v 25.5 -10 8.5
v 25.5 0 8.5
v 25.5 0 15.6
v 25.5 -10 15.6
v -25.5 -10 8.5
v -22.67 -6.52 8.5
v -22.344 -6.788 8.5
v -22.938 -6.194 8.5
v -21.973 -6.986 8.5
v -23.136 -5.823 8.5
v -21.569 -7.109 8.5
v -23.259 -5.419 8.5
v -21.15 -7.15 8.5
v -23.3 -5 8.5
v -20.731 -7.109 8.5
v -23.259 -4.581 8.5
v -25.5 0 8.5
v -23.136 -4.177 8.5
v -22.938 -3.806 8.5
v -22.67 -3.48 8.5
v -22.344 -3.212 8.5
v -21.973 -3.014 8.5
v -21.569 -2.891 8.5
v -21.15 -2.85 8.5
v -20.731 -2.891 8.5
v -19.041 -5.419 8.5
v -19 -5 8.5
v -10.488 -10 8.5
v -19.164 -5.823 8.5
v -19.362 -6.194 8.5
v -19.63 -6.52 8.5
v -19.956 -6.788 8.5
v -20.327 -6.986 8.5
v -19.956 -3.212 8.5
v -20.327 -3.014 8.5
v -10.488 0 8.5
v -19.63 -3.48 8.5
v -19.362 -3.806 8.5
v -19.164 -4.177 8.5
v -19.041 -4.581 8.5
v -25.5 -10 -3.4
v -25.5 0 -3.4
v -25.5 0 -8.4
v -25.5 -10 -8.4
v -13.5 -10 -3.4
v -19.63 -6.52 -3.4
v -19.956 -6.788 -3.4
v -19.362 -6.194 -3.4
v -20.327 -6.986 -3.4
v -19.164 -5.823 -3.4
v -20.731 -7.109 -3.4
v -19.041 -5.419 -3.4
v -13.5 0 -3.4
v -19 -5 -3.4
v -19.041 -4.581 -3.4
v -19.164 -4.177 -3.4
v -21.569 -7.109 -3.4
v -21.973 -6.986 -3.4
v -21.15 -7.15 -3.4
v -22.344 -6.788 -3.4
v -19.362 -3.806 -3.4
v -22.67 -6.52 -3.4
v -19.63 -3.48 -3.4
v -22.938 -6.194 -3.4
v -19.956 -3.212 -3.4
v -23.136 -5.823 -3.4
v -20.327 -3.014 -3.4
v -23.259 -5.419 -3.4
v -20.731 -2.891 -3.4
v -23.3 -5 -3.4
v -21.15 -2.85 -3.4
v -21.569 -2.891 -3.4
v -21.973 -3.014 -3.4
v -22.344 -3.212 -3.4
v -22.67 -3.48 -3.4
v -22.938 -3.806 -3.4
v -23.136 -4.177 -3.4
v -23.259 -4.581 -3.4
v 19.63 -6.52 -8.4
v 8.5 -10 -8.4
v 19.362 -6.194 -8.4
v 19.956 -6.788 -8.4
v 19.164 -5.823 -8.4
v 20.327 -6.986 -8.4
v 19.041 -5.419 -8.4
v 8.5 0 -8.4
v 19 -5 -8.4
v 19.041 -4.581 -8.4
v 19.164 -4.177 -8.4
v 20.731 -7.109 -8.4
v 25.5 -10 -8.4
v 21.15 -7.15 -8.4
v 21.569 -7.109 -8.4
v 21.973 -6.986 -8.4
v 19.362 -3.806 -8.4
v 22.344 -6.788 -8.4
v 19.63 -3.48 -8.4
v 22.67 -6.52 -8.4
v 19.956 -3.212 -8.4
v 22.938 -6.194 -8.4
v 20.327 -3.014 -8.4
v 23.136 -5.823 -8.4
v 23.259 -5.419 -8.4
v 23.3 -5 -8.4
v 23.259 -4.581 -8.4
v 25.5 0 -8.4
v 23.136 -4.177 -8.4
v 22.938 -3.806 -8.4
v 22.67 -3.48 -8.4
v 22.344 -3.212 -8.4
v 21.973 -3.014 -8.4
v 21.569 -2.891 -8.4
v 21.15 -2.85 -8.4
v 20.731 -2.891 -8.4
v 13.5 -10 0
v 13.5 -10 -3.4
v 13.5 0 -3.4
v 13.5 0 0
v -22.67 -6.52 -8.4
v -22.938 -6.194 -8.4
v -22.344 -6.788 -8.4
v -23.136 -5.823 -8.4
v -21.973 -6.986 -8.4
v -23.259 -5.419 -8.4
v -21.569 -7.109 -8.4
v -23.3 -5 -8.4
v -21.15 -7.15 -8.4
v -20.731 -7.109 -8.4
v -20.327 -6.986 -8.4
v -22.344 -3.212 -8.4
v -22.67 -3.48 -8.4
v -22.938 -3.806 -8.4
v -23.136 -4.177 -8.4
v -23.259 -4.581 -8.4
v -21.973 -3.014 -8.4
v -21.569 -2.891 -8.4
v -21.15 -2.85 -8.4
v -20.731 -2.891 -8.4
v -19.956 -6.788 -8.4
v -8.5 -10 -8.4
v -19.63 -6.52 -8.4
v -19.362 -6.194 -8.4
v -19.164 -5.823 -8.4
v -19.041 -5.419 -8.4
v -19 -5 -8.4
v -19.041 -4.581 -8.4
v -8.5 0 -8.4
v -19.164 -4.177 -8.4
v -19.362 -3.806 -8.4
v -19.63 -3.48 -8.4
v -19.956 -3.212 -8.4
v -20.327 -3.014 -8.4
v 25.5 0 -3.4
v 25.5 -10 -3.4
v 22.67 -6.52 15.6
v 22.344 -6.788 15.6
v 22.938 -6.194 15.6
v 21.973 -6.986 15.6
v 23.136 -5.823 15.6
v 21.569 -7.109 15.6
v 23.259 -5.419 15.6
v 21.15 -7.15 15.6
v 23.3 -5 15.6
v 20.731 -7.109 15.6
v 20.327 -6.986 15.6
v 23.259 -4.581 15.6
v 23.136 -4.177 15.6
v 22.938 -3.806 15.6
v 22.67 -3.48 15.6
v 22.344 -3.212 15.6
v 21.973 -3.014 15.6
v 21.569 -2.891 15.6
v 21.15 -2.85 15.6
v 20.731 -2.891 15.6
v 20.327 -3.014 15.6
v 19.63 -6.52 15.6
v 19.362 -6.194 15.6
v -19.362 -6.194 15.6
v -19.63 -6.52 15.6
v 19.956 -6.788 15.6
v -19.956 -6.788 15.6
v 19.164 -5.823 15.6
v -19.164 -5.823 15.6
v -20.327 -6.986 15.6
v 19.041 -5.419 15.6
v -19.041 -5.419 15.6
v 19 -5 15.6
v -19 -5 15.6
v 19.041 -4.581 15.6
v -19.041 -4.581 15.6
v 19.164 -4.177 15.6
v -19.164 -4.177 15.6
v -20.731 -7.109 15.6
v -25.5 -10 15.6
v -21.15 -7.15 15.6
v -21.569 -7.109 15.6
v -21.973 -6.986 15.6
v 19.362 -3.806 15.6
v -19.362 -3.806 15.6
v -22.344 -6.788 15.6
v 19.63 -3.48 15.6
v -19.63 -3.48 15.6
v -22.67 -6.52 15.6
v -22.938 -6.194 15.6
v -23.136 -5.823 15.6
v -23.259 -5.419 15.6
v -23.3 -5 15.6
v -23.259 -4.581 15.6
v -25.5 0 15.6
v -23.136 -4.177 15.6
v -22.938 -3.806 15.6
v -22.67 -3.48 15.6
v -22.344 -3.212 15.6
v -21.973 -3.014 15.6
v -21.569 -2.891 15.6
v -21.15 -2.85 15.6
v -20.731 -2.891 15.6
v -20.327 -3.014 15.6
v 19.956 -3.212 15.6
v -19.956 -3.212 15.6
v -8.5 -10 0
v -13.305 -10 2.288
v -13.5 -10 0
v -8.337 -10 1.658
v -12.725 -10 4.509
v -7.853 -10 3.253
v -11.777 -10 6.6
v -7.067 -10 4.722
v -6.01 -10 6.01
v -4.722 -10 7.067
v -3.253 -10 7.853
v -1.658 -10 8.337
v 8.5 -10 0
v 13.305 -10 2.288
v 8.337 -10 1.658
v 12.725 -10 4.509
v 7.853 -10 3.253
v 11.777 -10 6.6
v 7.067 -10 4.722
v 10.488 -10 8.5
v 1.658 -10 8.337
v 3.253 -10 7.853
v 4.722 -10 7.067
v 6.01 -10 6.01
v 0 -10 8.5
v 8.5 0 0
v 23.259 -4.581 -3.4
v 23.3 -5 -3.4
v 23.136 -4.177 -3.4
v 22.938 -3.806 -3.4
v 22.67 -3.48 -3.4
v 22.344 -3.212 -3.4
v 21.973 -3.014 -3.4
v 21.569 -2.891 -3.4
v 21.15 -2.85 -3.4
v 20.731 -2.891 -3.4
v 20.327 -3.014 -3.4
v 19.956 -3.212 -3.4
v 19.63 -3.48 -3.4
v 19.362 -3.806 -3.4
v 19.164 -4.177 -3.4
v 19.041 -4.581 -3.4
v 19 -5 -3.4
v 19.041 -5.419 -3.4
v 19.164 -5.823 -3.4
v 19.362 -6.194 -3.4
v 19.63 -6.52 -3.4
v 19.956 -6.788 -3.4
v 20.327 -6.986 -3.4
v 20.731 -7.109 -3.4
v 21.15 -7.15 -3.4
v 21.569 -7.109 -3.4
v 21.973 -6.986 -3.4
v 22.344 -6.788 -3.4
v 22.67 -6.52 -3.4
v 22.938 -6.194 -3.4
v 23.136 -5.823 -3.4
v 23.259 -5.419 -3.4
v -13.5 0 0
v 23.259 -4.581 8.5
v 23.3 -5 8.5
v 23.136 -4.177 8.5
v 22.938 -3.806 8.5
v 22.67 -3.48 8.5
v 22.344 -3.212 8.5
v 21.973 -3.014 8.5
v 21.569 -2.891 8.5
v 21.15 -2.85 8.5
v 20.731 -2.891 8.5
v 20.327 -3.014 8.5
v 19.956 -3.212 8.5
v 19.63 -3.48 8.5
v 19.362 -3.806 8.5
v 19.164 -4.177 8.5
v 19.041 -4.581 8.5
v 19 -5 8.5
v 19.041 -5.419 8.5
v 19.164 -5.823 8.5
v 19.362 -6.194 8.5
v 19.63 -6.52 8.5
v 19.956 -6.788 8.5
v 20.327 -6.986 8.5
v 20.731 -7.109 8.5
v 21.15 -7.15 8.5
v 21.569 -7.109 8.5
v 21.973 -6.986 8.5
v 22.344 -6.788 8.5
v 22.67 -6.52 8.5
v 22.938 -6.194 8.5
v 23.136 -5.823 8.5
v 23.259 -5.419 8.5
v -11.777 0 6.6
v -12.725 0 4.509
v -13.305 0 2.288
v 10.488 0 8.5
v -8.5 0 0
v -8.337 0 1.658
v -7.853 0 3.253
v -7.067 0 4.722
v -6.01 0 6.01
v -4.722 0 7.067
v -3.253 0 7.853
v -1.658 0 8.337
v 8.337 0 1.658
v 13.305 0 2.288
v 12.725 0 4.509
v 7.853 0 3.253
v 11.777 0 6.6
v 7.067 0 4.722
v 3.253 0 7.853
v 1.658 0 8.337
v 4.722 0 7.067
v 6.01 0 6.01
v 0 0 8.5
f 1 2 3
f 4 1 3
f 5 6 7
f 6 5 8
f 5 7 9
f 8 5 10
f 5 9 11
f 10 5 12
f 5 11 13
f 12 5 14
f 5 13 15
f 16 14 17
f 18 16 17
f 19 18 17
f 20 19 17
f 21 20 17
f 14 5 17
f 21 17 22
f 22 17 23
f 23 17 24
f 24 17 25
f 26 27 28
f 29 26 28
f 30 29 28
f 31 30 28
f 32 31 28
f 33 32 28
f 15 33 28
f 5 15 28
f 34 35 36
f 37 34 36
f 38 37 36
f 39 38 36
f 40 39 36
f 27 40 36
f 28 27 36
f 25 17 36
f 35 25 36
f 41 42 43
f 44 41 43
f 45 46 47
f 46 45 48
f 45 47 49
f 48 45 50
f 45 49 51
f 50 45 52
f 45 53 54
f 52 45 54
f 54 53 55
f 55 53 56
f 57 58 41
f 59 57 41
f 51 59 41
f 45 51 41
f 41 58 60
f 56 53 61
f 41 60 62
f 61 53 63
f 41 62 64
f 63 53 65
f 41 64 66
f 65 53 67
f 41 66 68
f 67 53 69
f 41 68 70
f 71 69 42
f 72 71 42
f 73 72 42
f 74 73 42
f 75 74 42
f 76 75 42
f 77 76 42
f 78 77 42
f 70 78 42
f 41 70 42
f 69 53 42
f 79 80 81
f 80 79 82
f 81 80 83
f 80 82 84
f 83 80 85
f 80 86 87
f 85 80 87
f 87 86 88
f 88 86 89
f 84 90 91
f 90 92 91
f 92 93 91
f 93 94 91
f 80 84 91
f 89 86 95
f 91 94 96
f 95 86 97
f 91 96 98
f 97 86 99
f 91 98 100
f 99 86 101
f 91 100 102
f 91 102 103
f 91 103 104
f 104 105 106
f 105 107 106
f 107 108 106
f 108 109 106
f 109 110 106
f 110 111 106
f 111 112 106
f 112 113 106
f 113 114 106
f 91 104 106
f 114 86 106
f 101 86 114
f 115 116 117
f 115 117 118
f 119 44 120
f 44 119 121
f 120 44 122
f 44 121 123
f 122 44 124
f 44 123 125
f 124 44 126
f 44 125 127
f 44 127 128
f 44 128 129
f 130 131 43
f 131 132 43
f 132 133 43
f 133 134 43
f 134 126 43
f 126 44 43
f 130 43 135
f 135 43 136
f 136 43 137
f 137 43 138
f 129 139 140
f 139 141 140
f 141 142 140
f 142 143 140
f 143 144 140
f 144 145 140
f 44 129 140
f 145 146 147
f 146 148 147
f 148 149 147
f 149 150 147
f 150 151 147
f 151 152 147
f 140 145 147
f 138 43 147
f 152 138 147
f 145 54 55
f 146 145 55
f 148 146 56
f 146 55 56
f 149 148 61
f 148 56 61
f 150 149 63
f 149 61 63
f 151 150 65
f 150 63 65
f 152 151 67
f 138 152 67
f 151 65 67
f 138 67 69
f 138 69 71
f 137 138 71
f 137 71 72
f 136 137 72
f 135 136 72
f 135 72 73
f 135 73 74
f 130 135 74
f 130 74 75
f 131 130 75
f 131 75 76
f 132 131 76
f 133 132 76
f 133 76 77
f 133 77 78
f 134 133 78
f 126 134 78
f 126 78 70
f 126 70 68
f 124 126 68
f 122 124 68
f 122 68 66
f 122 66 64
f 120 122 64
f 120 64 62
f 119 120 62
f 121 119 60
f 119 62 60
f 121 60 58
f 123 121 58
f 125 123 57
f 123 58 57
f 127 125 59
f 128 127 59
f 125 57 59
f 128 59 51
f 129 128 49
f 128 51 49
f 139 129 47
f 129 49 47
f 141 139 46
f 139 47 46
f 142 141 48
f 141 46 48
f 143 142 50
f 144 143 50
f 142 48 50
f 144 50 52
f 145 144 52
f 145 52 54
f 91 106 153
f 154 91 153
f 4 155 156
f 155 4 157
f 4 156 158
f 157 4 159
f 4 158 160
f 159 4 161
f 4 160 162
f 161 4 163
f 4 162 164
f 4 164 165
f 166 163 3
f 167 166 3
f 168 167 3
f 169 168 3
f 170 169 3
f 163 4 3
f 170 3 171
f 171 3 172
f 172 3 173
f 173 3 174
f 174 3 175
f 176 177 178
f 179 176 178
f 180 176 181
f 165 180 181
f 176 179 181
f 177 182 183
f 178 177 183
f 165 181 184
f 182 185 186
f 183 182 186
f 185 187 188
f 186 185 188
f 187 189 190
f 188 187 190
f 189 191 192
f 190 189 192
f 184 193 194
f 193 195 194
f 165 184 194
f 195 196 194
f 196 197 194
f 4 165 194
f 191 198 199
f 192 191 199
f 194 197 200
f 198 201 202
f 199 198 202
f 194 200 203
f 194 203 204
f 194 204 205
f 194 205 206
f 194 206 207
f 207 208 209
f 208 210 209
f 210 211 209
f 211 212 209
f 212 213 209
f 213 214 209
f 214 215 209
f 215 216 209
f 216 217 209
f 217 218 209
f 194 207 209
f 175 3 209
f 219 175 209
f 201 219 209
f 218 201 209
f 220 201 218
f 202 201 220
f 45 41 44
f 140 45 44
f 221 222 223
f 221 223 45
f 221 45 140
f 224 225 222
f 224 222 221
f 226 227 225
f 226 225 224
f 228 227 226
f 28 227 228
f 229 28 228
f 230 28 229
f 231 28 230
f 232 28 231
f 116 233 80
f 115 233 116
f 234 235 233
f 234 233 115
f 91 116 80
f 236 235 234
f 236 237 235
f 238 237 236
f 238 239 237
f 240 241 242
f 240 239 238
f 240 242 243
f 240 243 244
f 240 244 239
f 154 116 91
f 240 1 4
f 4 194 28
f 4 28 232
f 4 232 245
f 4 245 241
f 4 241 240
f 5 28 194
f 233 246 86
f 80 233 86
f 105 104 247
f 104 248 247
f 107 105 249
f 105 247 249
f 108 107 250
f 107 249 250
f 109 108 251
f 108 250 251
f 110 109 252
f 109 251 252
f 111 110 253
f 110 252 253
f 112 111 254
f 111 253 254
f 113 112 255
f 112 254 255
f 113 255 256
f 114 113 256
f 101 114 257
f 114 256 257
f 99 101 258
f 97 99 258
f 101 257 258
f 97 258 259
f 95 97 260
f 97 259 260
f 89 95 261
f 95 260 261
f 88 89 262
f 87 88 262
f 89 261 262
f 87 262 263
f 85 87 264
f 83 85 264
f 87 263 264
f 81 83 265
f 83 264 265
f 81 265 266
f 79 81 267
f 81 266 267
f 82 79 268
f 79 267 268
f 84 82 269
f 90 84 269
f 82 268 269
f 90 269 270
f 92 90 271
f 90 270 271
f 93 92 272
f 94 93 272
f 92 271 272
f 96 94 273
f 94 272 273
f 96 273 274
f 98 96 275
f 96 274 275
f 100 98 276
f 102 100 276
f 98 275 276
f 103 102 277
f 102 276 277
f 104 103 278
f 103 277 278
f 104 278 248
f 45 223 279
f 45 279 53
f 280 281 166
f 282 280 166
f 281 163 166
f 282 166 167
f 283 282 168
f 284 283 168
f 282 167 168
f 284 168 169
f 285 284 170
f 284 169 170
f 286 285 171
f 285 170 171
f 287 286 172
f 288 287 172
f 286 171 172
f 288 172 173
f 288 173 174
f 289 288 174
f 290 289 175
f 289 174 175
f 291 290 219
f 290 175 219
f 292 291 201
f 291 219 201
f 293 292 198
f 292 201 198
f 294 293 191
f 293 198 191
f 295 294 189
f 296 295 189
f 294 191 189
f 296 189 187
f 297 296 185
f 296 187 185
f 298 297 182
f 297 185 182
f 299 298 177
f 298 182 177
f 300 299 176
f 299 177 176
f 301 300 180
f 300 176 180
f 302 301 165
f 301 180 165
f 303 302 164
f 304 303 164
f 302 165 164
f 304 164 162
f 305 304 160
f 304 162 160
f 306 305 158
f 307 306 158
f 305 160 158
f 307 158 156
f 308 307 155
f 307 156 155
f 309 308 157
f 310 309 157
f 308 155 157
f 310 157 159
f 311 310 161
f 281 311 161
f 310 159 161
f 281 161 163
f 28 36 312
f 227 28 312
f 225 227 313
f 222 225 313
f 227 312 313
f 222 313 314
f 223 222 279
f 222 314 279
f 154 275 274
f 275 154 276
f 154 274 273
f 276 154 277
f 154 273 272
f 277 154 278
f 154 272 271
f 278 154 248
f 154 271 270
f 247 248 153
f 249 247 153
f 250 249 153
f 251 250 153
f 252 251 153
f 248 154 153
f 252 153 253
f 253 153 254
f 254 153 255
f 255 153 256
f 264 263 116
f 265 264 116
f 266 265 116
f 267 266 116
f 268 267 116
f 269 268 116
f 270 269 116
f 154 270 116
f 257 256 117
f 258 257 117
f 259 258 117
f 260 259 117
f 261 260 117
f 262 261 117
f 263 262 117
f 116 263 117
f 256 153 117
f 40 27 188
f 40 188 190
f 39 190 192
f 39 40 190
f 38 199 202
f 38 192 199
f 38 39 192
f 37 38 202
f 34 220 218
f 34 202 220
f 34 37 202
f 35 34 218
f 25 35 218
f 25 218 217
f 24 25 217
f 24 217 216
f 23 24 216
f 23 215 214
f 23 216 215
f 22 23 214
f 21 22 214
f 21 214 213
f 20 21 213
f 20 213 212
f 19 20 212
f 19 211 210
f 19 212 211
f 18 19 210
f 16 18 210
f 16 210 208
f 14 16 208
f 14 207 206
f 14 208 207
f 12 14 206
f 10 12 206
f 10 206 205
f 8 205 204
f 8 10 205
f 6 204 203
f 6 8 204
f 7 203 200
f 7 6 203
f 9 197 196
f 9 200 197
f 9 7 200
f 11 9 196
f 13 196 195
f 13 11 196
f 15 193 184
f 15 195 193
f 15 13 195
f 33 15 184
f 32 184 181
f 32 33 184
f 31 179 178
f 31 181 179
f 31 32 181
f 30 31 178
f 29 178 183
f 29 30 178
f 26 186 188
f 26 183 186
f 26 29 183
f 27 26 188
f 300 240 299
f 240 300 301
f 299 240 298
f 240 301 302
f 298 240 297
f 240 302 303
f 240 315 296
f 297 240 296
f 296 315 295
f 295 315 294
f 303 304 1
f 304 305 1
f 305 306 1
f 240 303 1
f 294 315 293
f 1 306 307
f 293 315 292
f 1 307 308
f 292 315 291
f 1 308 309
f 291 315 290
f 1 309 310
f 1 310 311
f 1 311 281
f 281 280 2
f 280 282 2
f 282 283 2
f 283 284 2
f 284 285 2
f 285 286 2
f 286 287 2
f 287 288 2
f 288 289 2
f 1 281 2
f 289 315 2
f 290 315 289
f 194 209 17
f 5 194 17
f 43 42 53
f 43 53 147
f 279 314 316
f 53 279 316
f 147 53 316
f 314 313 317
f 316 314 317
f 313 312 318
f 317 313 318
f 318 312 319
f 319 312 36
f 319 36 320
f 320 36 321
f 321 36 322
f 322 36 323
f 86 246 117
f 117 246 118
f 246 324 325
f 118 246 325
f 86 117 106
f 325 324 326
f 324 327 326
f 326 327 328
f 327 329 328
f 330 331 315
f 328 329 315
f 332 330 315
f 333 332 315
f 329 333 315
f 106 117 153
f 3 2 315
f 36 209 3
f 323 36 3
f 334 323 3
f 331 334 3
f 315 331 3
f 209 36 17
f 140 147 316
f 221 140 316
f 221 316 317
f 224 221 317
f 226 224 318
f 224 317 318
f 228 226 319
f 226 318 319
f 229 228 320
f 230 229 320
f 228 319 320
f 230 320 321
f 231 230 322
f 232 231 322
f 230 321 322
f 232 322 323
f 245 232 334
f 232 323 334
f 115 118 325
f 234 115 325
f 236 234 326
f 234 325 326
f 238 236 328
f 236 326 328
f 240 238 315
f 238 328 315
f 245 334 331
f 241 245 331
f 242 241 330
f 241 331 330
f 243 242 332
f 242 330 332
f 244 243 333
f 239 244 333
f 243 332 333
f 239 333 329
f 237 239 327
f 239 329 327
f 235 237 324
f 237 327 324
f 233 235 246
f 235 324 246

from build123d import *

# Parameters (mm, degrees)
F2_DEPTH = 10
F3_R     = 2.15
F4_DEPTH = 25


with BuildPart() as f2:
    # F1 (on Front) → F2 (new body)
    with BuildSketch(Plane.XZ):
        with BuildLine():
            Line((-25.5, -3.4), (-25.5, -8.4))
            Line((-25.5, -8.4), (-8.5, -8.4))
            Line((-8.5, -8.4), (-8.5, 0))
            ThreePointArc((-8.5, 0), (-6.0104076434, 6.0104076368), (-9.4e-09, 8.5))
            Line((-9.4e-09, 8.5), (-10.4880884817, 8.5))
            ThreePointArc((-10.4880884817, 8.5), (-12.7247631511, 4.5089247885), (-13.5, 0))
            Line((-13.5, 0), (-13.5, -3.4))
            Line((-13.5, -3.4), (-25.5, -3.4))
        make_face()
        with BuildLine():
            Line((10.4880884817, 8.5), (-9.4e-09, 8.5))
            ThreePointArc((-9.4e-09, 8.5), (6.0104076368, 6.0104076434), (8.5, 0))
            Line((8.5, 0), (8.5, -8.4))
            Line((8.5, -8.4), (25.5, -8.4))
            Line((25.5, -8.4), (25.5, -3.4))
            Line((25.5, -3.4), (13.5, -3.4))
            Line((13.5, -3.4), (13.5, 0))
            ThreePointArc((13.5, 0), (12.7247631511, 4.5089247885), (10.4880884817, 8.5))
        make_face()
        with BuildLine():
            Line((-10.4880884817, 8.5), (-9.4e-09, 8.5))
            Line((-9.4e-09, 8.5), (10.4880884817, 8.5))
            ThreePointArc((10.4880884817, 8.5), (0, 13.5), (-10.4880884817, 8.5))
        make_face()
        with BuildLine():
            Line((-25.5, 8.5), (-10.4880884817, 8.5))
            ThreePointArc((-10.4880884817, 8.5), (0, 13.5), (10.4880884817, 8.5))
            Line((10.4880884817, 8.5), (25.5, 8.5))
            Line((25.5, 8.5), (25.5, 15.6))
            Line((25.5, 15.6), (-25.5, 15.6))
            Line((-25.5, 15.6), (-25.5, 8.5))
        make_face()
    extrude(amount=F2_DEPTH)

    # F3 (on Top) → F4 (cut, symmetric)
    with BuildSketch(Plane.XY):
        with Locations((-21.15, -5)):
            Circle(F3_R)
        with Locations((21.15, -5)):
            Circle(F3_R)
    extrude(amount=F4_DEPTH, both=True, mode=Mode.SUBTRACT)


solid = f2.part
